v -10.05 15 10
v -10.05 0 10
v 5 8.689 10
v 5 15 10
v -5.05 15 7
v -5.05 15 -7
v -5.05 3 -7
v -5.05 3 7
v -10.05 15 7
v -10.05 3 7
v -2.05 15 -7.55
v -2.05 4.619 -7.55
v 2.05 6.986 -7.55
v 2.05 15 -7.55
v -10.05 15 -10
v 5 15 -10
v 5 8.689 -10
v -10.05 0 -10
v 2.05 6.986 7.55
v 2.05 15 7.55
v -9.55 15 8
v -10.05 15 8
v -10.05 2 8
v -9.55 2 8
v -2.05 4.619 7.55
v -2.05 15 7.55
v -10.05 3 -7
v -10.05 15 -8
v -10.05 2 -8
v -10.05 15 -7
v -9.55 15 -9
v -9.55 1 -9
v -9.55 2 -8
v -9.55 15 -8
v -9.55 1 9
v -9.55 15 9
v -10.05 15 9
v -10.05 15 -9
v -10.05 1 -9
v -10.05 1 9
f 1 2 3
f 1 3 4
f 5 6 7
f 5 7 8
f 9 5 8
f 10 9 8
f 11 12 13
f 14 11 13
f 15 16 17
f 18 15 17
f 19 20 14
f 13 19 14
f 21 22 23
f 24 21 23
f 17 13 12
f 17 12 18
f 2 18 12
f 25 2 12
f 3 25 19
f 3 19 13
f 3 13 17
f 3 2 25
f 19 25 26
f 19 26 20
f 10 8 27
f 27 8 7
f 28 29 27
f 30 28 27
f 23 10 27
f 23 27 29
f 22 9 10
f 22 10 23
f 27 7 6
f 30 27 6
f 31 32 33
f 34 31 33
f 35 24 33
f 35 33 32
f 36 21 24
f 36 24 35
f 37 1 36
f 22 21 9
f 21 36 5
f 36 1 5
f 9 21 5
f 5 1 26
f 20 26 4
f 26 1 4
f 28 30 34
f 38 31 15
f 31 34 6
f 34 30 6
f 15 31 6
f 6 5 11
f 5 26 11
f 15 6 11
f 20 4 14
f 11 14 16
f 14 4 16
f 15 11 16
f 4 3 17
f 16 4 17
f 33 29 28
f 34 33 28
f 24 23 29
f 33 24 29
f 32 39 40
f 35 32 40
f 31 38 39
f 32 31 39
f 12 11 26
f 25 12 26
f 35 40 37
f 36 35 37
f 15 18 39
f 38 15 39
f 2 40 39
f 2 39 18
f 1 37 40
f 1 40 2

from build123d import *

# Parameters (mm, degrees)
SKETCH2_W           = 10
SKETCH2_H           = 20
BOSS_EXTRUDE1_DEPTH = 15
SKETCH3_W           = 4.1
SKETCH3_H           = 15.1
CUT_EXTRUDE1_DEPTH  = 16
SKETCH4_W           = 2.95
SKETCH4_H           = 2.45
CUT_EXTRUDE2_DEPTH  = 15
SKETCH6_W           = 20
SKETCH6_H           = 15
BOSS_EXTRUDE2_DEPTH = 3
BOSS_EXTRUDE3_DEPTH = 5
CUT_EXTRUDE3_DEPTH  = 21
CUT_EXTRUDE4_DEPTH  = 0.5


with BuildPart() as part:
    # Sketch2 → Boss-Extrude1 (new body)
    with BuildSketch(Plane(origin=(0, 0, 0), x_dir=(1, 0, 0), z_dir=(0, 1, 0))):
        Rectangle(SKETCH2_W, SKETCH2_H)
    extrude(amount=BOSS_EXTRUDE1_DEPTH)

    # Sketch3 → Cut-Extrude1 (cut, through all)
    with BuildSketch(Plane(origin=(0, 15, 0), x_dir=(1, 0, 0), z_dir=(0, 1, 0))):
        Rectangle(SKETCH3_W, SKETCH3_H)
    extrude(amount=-CUT_EXTRUDE1_DEPTH, mode=Mode.SUBTRACT)

    # Sketch4 → Cut-Extrude2 (cut)
    with BuildSketch(Plane(origin=(0, 15, 0), x_dir=(1, 0, 0), z_dir=(0, 1, 0))):
        Polygon((-2.05, 10), (-5, 10), (-5, -7.55), (-2.05, -7.55), (-2.05, 7.55), align=None)
        with Locations((-3.525, -8.775)):
            Rectangle(SKETCH4_W, SKETCH4_H)
    extrude(amount=-CUT_EXTRUDE2_DEPTH, mode=Mode.SUBTRACT)

    # Sketch6 → Boss-Extrude2 (add)
    with BuildSketch(Plane.ZY.offset(2.05)):
        with Locations((0, 7.5)):
            Rectangle(SKETCH6_W, SKETCH6_H)
    extrude(amount=BOSS_EXTRUDE2_DEPTH)

    # Sketch8 → Boss-Extrude3 (add)
    with BuildSketch(Plane.ZY.offset(5.05)):
        Polygon((-7, 15), (-10, 15), (-10, 0), (10, 0), (10, 15), (7, 15), (7, 3), (-7, 3), align=None)
    extrude(amount=BOSS_EXTRUDE3_DEPTH)

    # Sketch10 → Cut-Extrude3 (cut, through all)
    with BuildSketch(Plane.XY.offset(10)):
        Polygon((-10.05, 0), (5, 8.689121551), (5, 0), align=None)
    extrude(amount=-CUT_EXTRUDE3_DEPTH, mode=Mode.SUBTRACT)

    # Sketch11 → Cut-Extrude4 (cut)
    with BuildSketch(Plane.ZY.offset(10.05)):
        Polygon((-8, 2), (-8, 15), (-9, 15), (-9, 1), (0, 1), (9, 1), (9, 15), (8, 15), (8, 2), (0, 2), align=None)
    extrude(amount=-CUT_EXTRUDE4_DEPTH, mode=Mode.SUBTRACT)


solid = part.part
